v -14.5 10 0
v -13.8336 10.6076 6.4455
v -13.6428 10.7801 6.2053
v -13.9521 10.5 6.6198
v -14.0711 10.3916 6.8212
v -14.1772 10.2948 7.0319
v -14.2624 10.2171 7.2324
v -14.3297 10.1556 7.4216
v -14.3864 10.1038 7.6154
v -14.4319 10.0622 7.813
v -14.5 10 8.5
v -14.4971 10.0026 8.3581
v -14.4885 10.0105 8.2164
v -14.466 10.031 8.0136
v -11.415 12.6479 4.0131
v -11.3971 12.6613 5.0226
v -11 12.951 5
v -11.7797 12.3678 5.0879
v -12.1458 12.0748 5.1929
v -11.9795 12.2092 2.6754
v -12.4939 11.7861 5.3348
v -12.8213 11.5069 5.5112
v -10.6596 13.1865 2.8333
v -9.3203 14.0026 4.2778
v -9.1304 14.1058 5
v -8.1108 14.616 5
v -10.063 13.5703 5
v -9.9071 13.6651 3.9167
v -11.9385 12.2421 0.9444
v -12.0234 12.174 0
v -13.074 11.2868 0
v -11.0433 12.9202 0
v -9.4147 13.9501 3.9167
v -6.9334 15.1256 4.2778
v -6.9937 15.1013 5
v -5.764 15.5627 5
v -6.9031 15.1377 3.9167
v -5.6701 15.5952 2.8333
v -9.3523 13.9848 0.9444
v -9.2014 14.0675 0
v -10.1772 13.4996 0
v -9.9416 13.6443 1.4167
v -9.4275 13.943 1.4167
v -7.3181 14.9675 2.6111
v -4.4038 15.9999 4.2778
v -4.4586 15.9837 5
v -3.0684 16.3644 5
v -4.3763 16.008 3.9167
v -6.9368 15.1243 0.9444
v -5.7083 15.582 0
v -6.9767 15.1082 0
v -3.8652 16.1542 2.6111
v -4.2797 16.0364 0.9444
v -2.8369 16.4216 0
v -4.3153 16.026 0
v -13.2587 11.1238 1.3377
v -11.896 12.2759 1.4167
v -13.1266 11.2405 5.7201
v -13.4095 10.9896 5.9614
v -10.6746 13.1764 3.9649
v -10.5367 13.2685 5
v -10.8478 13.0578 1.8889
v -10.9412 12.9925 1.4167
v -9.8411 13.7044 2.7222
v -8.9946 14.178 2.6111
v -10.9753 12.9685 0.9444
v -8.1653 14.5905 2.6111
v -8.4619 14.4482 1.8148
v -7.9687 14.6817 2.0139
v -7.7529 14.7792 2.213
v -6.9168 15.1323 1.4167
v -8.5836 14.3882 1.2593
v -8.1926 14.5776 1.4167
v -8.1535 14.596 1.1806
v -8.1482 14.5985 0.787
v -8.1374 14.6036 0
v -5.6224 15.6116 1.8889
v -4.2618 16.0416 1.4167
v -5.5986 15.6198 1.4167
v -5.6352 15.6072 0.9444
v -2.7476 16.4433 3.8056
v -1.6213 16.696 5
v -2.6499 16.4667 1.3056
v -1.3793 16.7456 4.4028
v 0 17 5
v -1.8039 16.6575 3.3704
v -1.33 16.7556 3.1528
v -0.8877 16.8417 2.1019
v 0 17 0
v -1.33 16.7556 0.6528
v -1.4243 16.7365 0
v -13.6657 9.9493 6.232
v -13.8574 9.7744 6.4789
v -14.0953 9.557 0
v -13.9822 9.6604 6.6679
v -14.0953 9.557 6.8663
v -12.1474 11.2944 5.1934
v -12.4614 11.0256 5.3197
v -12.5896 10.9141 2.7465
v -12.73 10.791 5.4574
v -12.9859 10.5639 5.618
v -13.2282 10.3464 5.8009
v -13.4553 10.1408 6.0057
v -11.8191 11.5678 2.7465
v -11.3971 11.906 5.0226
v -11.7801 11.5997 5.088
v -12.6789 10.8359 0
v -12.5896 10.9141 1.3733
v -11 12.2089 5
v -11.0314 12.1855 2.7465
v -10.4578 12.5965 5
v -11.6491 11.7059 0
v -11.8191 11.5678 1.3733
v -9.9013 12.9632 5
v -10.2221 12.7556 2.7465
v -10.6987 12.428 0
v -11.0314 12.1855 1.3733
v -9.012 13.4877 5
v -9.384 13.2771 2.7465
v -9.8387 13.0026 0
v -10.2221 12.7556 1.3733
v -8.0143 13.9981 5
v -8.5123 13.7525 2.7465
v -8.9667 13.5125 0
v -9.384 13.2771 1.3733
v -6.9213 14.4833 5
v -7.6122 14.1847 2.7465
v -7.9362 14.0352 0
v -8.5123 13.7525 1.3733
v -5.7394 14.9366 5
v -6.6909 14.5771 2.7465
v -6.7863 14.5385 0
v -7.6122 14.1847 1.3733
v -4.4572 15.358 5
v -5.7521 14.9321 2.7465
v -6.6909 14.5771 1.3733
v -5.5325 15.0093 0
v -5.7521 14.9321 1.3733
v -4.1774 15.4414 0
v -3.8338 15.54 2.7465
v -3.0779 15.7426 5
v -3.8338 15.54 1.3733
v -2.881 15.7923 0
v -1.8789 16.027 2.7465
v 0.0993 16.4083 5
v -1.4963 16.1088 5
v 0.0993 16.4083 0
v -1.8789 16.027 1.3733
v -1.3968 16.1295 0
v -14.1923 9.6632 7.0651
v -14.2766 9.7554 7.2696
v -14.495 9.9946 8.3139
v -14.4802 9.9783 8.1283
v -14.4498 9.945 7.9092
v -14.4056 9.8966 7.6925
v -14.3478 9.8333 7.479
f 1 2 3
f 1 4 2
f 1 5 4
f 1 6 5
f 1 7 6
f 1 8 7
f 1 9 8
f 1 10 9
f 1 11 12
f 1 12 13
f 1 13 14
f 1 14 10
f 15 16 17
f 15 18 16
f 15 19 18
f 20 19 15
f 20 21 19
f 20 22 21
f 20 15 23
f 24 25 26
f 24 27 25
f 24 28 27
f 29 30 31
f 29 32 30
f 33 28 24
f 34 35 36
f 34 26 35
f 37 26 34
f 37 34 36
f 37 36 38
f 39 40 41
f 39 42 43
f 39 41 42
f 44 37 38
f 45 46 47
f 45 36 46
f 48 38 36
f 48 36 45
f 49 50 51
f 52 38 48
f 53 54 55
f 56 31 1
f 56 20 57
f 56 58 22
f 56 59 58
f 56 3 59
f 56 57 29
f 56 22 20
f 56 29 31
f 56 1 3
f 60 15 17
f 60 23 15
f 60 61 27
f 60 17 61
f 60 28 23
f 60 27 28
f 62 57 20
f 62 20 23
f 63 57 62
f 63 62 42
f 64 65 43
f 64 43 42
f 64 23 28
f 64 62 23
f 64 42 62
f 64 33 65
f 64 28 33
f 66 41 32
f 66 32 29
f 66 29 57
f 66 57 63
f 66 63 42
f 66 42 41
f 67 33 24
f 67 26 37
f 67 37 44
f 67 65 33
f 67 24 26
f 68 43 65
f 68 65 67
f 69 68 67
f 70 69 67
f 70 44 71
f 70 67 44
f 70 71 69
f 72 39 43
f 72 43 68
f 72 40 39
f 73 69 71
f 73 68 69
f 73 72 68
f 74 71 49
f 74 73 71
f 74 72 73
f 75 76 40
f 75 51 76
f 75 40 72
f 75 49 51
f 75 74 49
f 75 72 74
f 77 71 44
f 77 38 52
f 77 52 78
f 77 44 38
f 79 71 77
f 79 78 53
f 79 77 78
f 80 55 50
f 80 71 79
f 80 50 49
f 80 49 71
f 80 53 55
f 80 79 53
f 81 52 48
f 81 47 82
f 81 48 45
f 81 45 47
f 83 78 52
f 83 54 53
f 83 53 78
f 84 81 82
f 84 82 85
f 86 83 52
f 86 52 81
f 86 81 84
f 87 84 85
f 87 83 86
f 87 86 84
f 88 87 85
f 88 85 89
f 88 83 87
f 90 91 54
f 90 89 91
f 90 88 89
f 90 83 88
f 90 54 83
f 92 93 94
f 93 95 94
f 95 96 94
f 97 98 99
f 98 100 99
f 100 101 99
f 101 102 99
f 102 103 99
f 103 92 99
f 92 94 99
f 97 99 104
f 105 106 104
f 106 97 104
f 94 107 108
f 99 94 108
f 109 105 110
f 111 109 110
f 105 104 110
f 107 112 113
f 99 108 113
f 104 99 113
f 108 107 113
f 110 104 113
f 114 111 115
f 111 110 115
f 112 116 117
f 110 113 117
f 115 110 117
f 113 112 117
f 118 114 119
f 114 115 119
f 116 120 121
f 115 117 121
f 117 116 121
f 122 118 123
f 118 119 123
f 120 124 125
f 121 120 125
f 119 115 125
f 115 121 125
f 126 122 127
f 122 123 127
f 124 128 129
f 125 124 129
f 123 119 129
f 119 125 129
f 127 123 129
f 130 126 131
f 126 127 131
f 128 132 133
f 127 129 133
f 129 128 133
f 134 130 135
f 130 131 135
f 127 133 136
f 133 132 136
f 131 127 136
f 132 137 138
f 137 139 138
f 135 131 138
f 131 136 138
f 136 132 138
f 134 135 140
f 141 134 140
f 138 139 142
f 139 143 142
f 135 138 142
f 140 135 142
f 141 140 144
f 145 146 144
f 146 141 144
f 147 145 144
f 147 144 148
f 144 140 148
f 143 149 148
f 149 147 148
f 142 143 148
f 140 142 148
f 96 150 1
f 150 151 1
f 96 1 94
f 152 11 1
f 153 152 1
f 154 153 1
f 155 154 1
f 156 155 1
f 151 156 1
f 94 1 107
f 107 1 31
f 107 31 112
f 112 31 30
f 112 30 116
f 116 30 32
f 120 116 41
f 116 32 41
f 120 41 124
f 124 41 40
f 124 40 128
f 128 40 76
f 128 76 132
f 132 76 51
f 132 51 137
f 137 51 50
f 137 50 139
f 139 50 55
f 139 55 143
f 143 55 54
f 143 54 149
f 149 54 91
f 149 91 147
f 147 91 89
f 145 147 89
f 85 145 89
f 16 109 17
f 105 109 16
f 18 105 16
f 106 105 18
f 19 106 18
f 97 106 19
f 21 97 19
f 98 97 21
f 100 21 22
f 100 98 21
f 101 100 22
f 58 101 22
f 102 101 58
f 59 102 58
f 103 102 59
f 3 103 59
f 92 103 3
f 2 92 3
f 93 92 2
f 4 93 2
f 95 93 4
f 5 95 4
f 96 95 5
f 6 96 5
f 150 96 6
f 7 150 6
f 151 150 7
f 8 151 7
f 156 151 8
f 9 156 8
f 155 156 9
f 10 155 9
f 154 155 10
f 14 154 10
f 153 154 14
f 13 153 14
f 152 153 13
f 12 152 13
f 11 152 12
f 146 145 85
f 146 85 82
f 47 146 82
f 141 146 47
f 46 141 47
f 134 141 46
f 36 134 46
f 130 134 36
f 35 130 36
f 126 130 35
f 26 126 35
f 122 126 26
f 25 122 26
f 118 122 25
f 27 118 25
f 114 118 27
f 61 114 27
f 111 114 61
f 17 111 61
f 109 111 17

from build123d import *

# Parameters (mm, degrees)
EXTRUDE_1_DEPTH     = 10
CUT_EXTRUDE_1_DEPTH = 31


with BuildPart() as part:
    # 草图1 → 凸台-拉伸1 (new body)
    with BuildSketch(Plane.XY):
        with BuildLine():
            Line((0.099286908, 16.408271929), (0, 17))
            add(Edge.make_bspline(
                [(-14.5, 10), (-13.275700684, 11.118325177), (-10.667201811, 13.52025873), (-5.620487725, 15.809154008), (-1.923873666, 16.677190458), (0, 17)],
                knots=[0, 0, 0, 0, 0.304837744, 0.643087388, 1, 1, 1, 1], degree=3))
            Line((-14.5, 10), (-14.095342354, 9.5569964))
            add(Edge.make_bspline(
                [(-14.095342354, 9.5569964), (-13.101804871, 10.464534261), (-11.5913204, 11.856193918), (-9.408207232, 13.308108948), (-7.031706102, 14.512216909), (-3.856829789, 15.620046614), (-1.224798532, 16.18610172), (0.099286908, 16.408271929)],
                knots=[0, 0, 0, 0, 0.25, 0.375, 0.5, 0.75, 1, 1, 1, 1], degree=3))
        make_face()
    extrude(amount=EXTRUDE_1_DEPTH)

    # 草图2 → 切除-拉伸1 (cut)
    with BuildSketch(Plane(origin=(0, 0, 0), x_dir=(1, 0, 0), z_dir=(0, 1, 0))):
        with BuildLine():
            Line((2.542403036, -5), (-11, -5))
            ThreePointArc((-11, -5), (-13.474873734, -6.025126266), (-14.5, -8.5))
            Line((-14.5, -8.5), (-14.5, -10))
            Line((-14.5, -10), (-14.5, -12.270940409))
            Line((-14.5, -12.270940409), (2.542403036, -12.270940409))
            Line((2.542403036, -12.270940409), (2.542403036, -5))
        make_face()
    extrude(amount=CUT_EXTRUDE_1_DEPTH, mode=Mode.SUBTRACT)


solid = part.part
